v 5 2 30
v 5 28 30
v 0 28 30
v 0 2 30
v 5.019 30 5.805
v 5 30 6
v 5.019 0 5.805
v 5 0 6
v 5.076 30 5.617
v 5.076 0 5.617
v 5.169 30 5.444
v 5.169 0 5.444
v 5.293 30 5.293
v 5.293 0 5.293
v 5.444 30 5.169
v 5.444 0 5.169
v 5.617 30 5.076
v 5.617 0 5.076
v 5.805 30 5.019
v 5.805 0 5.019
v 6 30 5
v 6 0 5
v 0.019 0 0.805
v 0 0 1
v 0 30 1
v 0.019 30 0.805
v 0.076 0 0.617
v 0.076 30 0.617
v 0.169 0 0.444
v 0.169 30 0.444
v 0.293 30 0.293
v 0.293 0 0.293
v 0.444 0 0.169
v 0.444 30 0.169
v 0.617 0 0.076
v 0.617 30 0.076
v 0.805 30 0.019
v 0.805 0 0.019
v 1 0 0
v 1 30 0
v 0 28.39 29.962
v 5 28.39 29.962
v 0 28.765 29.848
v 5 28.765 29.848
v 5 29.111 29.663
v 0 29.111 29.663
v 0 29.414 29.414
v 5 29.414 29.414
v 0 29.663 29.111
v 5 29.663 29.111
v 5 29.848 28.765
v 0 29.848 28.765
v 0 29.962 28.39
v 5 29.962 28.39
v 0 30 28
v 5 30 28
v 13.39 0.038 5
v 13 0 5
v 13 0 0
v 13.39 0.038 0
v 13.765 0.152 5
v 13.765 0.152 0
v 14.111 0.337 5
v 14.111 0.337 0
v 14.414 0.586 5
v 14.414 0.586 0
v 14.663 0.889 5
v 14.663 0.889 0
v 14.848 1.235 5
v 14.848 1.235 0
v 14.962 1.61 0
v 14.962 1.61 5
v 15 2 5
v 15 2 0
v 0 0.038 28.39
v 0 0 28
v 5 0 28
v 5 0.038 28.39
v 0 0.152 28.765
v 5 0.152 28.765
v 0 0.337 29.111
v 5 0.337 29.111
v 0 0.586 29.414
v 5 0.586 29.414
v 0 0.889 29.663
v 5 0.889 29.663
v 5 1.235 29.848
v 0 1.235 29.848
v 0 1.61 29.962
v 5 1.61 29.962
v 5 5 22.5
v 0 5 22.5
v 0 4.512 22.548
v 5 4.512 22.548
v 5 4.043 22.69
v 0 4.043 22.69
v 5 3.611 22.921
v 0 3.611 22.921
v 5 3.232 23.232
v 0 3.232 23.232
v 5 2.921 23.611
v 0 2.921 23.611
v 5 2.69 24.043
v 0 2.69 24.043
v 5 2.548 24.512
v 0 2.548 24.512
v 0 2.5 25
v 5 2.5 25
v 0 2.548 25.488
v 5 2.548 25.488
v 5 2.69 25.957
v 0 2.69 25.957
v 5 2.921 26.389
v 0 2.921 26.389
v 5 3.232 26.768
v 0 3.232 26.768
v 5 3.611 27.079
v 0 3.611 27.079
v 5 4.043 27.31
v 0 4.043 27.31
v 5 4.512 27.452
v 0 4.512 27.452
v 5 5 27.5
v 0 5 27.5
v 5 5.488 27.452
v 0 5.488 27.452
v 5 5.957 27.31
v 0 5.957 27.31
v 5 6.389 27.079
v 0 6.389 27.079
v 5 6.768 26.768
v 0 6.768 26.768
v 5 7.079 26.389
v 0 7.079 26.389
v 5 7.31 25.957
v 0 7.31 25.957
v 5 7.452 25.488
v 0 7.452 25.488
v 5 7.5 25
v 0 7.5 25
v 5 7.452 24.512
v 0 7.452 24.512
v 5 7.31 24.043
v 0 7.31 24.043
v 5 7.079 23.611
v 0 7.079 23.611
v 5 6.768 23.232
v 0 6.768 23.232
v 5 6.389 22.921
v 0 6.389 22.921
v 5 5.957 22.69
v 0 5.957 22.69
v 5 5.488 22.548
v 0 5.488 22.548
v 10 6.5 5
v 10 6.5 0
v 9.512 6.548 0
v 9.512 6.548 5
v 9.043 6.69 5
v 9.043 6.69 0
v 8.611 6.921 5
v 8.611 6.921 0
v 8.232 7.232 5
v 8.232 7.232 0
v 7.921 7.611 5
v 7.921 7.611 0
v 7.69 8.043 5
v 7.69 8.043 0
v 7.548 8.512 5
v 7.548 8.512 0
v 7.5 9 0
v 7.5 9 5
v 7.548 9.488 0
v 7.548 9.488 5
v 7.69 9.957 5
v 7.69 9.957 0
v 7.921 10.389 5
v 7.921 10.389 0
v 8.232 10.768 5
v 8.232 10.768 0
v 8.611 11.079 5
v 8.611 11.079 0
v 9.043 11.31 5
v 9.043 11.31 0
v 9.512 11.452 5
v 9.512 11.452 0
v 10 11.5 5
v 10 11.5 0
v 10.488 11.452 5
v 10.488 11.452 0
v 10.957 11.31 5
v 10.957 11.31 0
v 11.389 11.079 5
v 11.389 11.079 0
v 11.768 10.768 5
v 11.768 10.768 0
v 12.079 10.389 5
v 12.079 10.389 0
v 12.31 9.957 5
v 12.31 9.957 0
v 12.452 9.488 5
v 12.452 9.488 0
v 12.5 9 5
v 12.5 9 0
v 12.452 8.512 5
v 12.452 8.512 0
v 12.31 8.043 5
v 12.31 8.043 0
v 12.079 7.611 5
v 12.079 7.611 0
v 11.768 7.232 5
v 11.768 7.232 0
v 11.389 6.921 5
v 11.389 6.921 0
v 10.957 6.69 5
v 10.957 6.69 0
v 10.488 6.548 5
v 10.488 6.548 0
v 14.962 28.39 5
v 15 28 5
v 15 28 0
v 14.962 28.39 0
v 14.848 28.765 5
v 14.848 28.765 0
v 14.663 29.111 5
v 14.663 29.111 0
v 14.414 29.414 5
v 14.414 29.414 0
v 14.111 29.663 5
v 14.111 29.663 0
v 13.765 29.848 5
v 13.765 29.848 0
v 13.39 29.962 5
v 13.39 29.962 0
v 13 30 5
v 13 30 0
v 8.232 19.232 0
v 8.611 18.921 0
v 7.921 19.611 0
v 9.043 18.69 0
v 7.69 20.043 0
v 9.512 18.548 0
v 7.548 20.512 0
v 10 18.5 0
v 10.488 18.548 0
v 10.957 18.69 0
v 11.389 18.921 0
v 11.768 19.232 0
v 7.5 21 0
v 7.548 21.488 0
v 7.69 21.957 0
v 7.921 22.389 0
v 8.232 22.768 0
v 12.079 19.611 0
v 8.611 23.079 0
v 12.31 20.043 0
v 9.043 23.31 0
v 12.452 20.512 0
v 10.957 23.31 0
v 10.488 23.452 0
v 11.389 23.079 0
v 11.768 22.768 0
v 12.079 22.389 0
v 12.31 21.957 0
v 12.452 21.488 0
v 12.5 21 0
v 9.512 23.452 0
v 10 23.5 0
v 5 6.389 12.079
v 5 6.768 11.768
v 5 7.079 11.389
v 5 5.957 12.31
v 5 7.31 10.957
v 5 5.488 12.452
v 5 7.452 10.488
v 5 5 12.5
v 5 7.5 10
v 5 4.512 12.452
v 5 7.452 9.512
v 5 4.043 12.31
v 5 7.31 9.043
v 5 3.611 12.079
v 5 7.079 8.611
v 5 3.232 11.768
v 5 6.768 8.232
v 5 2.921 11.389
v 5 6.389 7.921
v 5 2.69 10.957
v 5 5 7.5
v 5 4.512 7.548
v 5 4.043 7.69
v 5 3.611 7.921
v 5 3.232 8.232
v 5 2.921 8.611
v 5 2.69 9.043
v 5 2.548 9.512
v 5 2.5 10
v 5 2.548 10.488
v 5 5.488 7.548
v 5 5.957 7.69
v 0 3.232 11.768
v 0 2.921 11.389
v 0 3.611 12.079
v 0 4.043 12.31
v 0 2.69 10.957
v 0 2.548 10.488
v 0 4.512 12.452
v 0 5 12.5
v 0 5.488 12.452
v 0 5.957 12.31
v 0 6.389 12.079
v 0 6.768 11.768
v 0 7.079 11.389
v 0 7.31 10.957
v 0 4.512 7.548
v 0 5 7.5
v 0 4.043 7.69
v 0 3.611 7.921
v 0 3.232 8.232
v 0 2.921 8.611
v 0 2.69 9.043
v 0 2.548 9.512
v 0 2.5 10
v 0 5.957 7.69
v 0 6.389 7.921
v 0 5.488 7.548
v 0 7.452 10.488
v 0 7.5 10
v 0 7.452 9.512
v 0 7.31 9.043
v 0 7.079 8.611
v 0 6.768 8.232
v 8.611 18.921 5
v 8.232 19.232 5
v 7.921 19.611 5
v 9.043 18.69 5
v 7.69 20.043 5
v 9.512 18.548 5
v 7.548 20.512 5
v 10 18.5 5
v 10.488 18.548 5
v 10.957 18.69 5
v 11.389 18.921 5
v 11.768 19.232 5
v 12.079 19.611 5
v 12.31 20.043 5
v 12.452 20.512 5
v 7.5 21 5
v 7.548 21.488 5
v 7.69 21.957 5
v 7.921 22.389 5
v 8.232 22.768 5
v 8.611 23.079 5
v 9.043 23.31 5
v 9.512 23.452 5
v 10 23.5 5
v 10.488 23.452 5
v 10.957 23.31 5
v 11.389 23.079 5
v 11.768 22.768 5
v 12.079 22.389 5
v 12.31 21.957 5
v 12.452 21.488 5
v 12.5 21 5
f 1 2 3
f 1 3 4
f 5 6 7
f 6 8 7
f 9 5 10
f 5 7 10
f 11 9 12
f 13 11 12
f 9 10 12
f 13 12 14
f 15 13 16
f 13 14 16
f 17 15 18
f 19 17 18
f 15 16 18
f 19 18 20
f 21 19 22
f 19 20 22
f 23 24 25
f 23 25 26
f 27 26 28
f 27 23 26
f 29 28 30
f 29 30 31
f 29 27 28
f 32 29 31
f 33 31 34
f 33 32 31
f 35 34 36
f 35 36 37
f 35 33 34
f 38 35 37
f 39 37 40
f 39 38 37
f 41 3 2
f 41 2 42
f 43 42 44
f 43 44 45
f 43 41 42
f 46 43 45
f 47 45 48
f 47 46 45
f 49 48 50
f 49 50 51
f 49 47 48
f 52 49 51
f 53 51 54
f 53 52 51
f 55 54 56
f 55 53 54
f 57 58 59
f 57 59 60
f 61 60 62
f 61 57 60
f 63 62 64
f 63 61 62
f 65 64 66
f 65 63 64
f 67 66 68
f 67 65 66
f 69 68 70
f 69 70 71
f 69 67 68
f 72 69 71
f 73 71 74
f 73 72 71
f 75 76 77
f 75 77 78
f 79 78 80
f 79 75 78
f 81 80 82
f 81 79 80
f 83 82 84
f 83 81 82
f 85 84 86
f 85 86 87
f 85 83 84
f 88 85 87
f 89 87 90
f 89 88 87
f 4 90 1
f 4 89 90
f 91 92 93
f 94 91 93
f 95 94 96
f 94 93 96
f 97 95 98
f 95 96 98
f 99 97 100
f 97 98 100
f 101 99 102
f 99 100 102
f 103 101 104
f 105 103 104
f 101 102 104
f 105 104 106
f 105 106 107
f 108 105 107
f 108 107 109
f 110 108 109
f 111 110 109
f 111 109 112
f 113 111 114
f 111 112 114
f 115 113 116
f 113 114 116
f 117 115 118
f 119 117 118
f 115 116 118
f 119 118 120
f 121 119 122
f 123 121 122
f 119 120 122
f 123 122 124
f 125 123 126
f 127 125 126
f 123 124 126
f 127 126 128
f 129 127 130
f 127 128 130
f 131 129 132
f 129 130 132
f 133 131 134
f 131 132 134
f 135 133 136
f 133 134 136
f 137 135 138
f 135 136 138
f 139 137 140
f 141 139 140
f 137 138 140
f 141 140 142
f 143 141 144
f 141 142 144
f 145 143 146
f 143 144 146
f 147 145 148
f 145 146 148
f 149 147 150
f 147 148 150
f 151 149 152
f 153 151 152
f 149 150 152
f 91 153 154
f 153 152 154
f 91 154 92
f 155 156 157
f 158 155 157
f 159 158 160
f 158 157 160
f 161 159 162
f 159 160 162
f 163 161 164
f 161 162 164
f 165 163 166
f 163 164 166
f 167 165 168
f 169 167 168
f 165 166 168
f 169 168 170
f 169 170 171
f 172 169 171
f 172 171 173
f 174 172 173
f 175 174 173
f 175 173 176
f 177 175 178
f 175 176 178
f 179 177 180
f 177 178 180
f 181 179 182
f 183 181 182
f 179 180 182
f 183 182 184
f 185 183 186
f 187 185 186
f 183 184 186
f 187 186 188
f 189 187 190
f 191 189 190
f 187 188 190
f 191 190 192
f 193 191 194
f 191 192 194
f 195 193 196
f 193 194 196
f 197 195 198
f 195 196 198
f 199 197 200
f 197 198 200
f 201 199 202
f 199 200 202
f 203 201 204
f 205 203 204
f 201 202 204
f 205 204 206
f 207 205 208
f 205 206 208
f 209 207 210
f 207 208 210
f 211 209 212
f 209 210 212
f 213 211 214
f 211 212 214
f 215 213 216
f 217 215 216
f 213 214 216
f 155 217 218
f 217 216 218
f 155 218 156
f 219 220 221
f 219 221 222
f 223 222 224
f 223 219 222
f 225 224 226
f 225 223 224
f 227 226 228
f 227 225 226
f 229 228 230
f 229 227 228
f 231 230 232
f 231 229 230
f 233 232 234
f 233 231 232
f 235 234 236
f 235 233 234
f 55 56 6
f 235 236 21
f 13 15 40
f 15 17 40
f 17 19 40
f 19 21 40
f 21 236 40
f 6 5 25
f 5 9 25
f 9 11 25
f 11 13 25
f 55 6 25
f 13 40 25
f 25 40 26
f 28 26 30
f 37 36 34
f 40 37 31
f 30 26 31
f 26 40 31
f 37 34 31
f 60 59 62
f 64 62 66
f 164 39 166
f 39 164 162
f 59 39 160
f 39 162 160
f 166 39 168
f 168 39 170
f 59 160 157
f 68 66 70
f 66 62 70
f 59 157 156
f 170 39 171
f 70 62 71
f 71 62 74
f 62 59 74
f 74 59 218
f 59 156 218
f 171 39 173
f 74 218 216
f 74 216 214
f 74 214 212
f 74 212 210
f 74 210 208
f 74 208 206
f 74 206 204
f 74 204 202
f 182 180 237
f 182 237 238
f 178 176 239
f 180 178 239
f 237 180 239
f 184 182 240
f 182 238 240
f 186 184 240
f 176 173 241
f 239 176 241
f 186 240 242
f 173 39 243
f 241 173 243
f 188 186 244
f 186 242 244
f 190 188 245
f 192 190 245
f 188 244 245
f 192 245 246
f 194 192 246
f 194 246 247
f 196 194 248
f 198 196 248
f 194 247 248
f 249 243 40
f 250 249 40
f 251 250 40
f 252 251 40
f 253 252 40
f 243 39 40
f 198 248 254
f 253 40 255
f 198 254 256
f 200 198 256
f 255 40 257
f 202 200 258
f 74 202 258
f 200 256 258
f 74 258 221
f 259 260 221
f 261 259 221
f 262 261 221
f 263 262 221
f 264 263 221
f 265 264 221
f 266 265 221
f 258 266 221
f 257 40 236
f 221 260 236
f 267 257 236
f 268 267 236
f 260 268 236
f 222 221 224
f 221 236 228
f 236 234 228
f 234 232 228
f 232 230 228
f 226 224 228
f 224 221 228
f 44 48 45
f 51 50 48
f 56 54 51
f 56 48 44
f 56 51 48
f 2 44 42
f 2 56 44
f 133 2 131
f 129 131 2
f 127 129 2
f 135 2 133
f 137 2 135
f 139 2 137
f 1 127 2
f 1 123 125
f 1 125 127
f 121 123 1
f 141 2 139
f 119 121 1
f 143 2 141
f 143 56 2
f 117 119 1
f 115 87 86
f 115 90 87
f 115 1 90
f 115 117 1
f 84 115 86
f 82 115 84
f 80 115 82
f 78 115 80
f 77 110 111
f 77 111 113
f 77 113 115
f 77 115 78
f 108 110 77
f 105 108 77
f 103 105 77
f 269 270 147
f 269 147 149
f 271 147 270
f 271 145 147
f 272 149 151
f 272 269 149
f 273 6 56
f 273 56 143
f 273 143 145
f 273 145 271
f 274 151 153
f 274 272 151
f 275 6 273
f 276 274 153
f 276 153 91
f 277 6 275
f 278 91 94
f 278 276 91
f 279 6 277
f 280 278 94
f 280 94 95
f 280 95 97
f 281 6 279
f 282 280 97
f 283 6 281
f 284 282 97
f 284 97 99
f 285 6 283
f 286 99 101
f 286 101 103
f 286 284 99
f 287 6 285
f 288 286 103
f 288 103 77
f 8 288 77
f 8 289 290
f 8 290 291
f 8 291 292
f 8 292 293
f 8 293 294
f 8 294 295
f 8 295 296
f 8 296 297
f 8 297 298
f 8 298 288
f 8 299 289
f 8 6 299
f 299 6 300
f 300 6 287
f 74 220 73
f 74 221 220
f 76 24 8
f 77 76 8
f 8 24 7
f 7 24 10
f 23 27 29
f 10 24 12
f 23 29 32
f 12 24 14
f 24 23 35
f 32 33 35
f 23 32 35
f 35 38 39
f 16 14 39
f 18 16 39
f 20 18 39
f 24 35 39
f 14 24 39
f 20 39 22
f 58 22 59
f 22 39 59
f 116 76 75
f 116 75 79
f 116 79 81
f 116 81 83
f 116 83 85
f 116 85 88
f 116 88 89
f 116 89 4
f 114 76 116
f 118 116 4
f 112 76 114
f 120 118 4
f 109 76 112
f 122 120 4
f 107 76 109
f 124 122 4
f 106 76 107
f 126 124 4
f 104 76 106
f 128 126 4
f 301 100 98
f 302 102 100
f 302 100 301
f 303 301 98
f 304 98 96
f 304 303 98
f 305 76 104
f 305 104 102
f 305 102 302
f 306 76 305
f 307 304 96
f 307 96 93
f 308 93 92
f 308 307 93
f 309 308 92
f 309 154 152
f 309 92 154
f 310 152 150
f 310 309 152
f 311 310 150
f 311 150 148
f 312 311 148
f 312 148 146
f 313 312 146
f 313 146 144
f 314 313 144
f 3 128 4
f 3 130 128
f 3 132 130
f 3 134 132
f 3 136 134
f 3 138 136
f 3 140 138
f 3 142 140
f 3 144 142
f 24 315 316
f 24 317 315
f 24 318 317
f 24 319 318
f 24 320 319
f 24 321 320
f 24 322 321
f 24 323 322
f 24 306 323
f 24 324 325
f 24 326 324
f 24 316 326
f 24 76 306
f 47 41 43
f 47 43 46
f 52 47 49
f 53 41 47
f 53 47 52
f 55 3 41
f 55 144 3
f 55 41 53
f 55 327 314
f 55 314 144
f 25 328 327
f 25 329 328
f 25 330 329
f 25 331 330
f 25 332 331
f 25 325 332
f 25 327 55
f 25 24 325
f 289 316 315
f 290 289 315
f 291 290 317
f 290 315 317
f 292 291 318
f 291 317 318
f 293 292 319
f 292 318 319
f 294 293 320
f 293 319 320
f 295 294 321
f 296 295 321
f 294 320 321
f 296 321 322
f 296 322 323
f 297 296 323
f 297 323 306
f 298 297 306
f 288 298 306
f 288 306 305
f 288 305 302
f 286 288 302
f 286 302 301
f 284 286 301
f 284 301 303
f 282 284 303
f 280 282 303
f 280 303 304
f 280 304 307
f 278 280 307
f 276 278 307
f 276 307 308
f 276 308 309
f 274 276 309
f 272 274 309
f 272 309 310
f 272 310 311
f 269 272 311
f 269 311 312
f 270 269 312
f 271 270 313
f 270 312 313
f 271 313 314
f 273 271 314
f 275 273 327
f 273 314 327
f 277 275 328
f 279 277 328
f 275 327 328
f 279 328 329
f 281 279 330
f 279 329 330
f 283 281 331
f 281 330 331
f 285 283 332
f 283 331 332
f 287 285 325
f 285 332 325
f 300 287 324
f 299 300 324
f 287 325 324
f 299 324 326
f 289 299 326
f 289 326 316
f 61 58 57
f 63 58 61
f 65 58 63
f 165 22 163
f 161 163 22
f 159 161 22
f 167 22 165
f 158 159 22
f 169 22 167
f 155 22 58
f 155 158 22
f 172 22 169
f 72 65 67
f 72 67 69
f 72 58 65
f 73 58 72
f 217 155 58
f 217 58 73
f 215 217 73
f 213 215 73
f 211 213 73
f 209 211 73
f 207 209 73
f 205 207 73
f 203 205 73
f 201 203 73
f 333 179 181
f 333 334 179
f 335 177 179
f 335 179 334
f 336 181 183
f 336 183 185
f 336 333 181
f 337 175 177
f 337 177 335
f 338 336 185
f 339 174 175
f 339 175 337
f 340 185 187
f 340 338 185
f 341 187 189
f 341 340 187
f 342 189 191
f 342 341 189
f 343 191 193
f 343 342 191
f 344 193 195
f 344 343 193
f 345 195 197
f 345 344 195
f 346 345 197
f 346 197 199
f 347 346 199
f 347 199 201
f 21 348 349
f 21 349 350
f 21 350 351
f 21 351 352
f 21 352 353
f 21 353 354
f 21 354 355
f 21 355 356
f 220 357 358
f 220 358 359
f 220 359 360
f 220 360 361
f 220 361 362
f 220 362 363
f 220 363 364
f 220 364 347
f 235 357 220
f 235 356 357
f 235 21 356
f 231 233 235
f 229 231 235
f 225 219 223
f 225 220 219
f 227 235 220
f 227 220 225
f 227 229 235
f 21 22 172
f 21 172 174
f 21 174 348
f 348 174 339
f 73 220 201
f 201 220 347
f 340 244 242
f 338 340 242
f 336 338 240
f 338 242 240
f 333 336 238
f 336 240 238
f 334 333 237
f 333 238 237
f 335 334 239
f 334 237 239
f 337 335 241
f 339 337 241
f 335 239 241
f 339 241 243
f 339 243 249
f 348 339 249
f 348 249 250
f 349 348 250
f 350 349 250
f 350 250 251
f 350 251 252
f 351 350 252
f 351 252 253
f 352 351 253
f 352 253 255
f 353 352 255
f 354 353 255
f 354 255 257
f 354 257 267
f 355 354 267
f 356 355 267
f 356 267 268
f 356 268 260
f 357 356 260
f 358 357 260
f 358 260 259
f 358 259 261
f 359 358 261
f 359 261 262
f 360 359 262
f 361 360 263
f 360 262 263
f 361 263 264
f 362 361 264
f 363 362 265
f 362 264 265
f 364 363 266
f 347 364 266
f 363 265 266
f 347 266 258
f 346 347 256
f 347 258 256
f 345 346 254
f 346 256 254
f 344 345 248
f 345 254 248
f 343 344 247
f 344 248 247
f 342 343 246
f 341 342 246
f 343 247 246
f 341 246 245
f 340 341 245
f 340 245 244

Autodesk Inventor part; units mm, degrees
ref_plane "YZ Plane" through (0, 0, 0) normal (1, 0, 0) x (0, 1, 0)
ref_plane "XZ Plane" through (0, 0, 0) normal (0, 1, 0) x (-1, 0, 0)
ref_plane "XY Plane" through (0, 0, 0) normal (0, 0, 1) x (1, 0, 0)
sketch "スケッチ1" plane through (0, 0, 0) normal (0, 0, 1) x (1, 0, 0)
  line L0 (0, 0) -> (5, 0)
  line L1 (5, 0) -> (5, 30)
  line L2 (5, 30) -> (0, 30)
  line L3 (0, 30) -> (0, 0)
  line L4 (5, 30) -> (15, 30)
  line L5 (15, 30) -> (15, 0)
  line L6 (15, 0) -> (5, 0)
  line L7 (5, 0) -> (5, 30)
  dimension "d0" = 30
  dimension "d1" = 5
  dimension "d2" = 30
  dimension "d3" = 10
extrude "押し出し1" add sketch "スケッチ1" along normal blind 5
sketch "スケッチ2" plane through (0, 0, 5) normal (0, 0, 1) x (1, 0, 0)
  line L0 (15, 0) -> (15, 30) projected
  line L1 (0, 0) -> (15, 0) projected
  line L2 (15, 30) -> (5, 30)
  line L3 (5, 30) -> (5, 0)
  line L4 (5, 0) -> (15, 0)
  line L5 (15, 0) -> (15, 30)
  point P0 (10, 21)
  point P1 (10, 9)
  dimension "d6" = 10
  dimension "d7" = 5
  dimension "d8" = 9
  dimension "d9" = 9
  dimension "d10" = 5
hole "穴1" at (10, 21, 5) at (10, 9, 5) direction (0, 0, -1) diameter 5 depth 8
sketch "スケッチ3" plane through (0, 0, 5) normal (0, 0, 1) x (1, 0, 0)
  line L0 (15, 30) -> (0, 30) projected
  line L1 (0, 0) -> (15, 0) projected
  line L2 (0, 30) -> (5, 30)
  line L3 (5, 30) -> (5, 0)
  line L4 (5, 0) -> (0, 0)
  line L5 (0, 0) -> (0, 30)
  dimension "d18" = 5
extrude "押し出し2" add sketch "スケッチ3" along normal blind 30
sketch "スケッチ4" plane through (5, 0, 5) normal (1, 0, 0) x (0, 0, -1)
  line L0 (-30, 0) -> (-30, 30) projected
  line L1 (0, 0) -> (-30, 0) projected
  line L2 (5, 0) -> (5, 30) projected
  point P0 (-20, 5)
  point P1 (-5, 5)
  dimension "d21" = 15
  dimension "d22" = 10
  dimension "d23" = 5
  dimension "d24" = 5
  dimension "d25" = 10
hole "穴2" at (5, 5, 25) at (5, 5, 10) direction (-1, 0, 0) diameter 5 depth 8
sketch "スケッチ5" plane through (5, 0, 5) normal (1, 0, 0) x (0, 0, -1)
  line L0 (5, 30) -> (-30, 30) projected
  line L1 (-30, 30) -> (-25, 30)
  line L2 (-25, 30) -> (-25, 0)
  line L3 (-25, 0) -> (-30, 0)
  line L4 (-30, 0) -> (-30, 30)
  line L5 (0, 0) -> (0, 30) projected
  circle A0 centre (-5, 5) radius 2.5 projected
  circle A1 centre (-20, 5) radius 2.5 projected
  point P0 (5, 0)
  dimension "d33" = 5
  dimension "d34" = 5
extrude "押し出し3" cut sketch "スケッチ5" against normal through all contours L2 L3 L4 L0
fillet "フィレット1" radius 2 4 edges at (2.5, 30, 30) (2.5, 0, 30) (15, 30, 2.5) (15, 0, 2.5)
fillet "フィレット2" radius 1 2 edges at (0, 15, 0) (5, 15, 5)
equation "\"d9\" = d8"
equation "\"d10\" = d7"
equation "\"d24\" = d23"
equation "\"d34\" = d33"
properties part number "BP_BOX-Support-Bar-Connect1"
